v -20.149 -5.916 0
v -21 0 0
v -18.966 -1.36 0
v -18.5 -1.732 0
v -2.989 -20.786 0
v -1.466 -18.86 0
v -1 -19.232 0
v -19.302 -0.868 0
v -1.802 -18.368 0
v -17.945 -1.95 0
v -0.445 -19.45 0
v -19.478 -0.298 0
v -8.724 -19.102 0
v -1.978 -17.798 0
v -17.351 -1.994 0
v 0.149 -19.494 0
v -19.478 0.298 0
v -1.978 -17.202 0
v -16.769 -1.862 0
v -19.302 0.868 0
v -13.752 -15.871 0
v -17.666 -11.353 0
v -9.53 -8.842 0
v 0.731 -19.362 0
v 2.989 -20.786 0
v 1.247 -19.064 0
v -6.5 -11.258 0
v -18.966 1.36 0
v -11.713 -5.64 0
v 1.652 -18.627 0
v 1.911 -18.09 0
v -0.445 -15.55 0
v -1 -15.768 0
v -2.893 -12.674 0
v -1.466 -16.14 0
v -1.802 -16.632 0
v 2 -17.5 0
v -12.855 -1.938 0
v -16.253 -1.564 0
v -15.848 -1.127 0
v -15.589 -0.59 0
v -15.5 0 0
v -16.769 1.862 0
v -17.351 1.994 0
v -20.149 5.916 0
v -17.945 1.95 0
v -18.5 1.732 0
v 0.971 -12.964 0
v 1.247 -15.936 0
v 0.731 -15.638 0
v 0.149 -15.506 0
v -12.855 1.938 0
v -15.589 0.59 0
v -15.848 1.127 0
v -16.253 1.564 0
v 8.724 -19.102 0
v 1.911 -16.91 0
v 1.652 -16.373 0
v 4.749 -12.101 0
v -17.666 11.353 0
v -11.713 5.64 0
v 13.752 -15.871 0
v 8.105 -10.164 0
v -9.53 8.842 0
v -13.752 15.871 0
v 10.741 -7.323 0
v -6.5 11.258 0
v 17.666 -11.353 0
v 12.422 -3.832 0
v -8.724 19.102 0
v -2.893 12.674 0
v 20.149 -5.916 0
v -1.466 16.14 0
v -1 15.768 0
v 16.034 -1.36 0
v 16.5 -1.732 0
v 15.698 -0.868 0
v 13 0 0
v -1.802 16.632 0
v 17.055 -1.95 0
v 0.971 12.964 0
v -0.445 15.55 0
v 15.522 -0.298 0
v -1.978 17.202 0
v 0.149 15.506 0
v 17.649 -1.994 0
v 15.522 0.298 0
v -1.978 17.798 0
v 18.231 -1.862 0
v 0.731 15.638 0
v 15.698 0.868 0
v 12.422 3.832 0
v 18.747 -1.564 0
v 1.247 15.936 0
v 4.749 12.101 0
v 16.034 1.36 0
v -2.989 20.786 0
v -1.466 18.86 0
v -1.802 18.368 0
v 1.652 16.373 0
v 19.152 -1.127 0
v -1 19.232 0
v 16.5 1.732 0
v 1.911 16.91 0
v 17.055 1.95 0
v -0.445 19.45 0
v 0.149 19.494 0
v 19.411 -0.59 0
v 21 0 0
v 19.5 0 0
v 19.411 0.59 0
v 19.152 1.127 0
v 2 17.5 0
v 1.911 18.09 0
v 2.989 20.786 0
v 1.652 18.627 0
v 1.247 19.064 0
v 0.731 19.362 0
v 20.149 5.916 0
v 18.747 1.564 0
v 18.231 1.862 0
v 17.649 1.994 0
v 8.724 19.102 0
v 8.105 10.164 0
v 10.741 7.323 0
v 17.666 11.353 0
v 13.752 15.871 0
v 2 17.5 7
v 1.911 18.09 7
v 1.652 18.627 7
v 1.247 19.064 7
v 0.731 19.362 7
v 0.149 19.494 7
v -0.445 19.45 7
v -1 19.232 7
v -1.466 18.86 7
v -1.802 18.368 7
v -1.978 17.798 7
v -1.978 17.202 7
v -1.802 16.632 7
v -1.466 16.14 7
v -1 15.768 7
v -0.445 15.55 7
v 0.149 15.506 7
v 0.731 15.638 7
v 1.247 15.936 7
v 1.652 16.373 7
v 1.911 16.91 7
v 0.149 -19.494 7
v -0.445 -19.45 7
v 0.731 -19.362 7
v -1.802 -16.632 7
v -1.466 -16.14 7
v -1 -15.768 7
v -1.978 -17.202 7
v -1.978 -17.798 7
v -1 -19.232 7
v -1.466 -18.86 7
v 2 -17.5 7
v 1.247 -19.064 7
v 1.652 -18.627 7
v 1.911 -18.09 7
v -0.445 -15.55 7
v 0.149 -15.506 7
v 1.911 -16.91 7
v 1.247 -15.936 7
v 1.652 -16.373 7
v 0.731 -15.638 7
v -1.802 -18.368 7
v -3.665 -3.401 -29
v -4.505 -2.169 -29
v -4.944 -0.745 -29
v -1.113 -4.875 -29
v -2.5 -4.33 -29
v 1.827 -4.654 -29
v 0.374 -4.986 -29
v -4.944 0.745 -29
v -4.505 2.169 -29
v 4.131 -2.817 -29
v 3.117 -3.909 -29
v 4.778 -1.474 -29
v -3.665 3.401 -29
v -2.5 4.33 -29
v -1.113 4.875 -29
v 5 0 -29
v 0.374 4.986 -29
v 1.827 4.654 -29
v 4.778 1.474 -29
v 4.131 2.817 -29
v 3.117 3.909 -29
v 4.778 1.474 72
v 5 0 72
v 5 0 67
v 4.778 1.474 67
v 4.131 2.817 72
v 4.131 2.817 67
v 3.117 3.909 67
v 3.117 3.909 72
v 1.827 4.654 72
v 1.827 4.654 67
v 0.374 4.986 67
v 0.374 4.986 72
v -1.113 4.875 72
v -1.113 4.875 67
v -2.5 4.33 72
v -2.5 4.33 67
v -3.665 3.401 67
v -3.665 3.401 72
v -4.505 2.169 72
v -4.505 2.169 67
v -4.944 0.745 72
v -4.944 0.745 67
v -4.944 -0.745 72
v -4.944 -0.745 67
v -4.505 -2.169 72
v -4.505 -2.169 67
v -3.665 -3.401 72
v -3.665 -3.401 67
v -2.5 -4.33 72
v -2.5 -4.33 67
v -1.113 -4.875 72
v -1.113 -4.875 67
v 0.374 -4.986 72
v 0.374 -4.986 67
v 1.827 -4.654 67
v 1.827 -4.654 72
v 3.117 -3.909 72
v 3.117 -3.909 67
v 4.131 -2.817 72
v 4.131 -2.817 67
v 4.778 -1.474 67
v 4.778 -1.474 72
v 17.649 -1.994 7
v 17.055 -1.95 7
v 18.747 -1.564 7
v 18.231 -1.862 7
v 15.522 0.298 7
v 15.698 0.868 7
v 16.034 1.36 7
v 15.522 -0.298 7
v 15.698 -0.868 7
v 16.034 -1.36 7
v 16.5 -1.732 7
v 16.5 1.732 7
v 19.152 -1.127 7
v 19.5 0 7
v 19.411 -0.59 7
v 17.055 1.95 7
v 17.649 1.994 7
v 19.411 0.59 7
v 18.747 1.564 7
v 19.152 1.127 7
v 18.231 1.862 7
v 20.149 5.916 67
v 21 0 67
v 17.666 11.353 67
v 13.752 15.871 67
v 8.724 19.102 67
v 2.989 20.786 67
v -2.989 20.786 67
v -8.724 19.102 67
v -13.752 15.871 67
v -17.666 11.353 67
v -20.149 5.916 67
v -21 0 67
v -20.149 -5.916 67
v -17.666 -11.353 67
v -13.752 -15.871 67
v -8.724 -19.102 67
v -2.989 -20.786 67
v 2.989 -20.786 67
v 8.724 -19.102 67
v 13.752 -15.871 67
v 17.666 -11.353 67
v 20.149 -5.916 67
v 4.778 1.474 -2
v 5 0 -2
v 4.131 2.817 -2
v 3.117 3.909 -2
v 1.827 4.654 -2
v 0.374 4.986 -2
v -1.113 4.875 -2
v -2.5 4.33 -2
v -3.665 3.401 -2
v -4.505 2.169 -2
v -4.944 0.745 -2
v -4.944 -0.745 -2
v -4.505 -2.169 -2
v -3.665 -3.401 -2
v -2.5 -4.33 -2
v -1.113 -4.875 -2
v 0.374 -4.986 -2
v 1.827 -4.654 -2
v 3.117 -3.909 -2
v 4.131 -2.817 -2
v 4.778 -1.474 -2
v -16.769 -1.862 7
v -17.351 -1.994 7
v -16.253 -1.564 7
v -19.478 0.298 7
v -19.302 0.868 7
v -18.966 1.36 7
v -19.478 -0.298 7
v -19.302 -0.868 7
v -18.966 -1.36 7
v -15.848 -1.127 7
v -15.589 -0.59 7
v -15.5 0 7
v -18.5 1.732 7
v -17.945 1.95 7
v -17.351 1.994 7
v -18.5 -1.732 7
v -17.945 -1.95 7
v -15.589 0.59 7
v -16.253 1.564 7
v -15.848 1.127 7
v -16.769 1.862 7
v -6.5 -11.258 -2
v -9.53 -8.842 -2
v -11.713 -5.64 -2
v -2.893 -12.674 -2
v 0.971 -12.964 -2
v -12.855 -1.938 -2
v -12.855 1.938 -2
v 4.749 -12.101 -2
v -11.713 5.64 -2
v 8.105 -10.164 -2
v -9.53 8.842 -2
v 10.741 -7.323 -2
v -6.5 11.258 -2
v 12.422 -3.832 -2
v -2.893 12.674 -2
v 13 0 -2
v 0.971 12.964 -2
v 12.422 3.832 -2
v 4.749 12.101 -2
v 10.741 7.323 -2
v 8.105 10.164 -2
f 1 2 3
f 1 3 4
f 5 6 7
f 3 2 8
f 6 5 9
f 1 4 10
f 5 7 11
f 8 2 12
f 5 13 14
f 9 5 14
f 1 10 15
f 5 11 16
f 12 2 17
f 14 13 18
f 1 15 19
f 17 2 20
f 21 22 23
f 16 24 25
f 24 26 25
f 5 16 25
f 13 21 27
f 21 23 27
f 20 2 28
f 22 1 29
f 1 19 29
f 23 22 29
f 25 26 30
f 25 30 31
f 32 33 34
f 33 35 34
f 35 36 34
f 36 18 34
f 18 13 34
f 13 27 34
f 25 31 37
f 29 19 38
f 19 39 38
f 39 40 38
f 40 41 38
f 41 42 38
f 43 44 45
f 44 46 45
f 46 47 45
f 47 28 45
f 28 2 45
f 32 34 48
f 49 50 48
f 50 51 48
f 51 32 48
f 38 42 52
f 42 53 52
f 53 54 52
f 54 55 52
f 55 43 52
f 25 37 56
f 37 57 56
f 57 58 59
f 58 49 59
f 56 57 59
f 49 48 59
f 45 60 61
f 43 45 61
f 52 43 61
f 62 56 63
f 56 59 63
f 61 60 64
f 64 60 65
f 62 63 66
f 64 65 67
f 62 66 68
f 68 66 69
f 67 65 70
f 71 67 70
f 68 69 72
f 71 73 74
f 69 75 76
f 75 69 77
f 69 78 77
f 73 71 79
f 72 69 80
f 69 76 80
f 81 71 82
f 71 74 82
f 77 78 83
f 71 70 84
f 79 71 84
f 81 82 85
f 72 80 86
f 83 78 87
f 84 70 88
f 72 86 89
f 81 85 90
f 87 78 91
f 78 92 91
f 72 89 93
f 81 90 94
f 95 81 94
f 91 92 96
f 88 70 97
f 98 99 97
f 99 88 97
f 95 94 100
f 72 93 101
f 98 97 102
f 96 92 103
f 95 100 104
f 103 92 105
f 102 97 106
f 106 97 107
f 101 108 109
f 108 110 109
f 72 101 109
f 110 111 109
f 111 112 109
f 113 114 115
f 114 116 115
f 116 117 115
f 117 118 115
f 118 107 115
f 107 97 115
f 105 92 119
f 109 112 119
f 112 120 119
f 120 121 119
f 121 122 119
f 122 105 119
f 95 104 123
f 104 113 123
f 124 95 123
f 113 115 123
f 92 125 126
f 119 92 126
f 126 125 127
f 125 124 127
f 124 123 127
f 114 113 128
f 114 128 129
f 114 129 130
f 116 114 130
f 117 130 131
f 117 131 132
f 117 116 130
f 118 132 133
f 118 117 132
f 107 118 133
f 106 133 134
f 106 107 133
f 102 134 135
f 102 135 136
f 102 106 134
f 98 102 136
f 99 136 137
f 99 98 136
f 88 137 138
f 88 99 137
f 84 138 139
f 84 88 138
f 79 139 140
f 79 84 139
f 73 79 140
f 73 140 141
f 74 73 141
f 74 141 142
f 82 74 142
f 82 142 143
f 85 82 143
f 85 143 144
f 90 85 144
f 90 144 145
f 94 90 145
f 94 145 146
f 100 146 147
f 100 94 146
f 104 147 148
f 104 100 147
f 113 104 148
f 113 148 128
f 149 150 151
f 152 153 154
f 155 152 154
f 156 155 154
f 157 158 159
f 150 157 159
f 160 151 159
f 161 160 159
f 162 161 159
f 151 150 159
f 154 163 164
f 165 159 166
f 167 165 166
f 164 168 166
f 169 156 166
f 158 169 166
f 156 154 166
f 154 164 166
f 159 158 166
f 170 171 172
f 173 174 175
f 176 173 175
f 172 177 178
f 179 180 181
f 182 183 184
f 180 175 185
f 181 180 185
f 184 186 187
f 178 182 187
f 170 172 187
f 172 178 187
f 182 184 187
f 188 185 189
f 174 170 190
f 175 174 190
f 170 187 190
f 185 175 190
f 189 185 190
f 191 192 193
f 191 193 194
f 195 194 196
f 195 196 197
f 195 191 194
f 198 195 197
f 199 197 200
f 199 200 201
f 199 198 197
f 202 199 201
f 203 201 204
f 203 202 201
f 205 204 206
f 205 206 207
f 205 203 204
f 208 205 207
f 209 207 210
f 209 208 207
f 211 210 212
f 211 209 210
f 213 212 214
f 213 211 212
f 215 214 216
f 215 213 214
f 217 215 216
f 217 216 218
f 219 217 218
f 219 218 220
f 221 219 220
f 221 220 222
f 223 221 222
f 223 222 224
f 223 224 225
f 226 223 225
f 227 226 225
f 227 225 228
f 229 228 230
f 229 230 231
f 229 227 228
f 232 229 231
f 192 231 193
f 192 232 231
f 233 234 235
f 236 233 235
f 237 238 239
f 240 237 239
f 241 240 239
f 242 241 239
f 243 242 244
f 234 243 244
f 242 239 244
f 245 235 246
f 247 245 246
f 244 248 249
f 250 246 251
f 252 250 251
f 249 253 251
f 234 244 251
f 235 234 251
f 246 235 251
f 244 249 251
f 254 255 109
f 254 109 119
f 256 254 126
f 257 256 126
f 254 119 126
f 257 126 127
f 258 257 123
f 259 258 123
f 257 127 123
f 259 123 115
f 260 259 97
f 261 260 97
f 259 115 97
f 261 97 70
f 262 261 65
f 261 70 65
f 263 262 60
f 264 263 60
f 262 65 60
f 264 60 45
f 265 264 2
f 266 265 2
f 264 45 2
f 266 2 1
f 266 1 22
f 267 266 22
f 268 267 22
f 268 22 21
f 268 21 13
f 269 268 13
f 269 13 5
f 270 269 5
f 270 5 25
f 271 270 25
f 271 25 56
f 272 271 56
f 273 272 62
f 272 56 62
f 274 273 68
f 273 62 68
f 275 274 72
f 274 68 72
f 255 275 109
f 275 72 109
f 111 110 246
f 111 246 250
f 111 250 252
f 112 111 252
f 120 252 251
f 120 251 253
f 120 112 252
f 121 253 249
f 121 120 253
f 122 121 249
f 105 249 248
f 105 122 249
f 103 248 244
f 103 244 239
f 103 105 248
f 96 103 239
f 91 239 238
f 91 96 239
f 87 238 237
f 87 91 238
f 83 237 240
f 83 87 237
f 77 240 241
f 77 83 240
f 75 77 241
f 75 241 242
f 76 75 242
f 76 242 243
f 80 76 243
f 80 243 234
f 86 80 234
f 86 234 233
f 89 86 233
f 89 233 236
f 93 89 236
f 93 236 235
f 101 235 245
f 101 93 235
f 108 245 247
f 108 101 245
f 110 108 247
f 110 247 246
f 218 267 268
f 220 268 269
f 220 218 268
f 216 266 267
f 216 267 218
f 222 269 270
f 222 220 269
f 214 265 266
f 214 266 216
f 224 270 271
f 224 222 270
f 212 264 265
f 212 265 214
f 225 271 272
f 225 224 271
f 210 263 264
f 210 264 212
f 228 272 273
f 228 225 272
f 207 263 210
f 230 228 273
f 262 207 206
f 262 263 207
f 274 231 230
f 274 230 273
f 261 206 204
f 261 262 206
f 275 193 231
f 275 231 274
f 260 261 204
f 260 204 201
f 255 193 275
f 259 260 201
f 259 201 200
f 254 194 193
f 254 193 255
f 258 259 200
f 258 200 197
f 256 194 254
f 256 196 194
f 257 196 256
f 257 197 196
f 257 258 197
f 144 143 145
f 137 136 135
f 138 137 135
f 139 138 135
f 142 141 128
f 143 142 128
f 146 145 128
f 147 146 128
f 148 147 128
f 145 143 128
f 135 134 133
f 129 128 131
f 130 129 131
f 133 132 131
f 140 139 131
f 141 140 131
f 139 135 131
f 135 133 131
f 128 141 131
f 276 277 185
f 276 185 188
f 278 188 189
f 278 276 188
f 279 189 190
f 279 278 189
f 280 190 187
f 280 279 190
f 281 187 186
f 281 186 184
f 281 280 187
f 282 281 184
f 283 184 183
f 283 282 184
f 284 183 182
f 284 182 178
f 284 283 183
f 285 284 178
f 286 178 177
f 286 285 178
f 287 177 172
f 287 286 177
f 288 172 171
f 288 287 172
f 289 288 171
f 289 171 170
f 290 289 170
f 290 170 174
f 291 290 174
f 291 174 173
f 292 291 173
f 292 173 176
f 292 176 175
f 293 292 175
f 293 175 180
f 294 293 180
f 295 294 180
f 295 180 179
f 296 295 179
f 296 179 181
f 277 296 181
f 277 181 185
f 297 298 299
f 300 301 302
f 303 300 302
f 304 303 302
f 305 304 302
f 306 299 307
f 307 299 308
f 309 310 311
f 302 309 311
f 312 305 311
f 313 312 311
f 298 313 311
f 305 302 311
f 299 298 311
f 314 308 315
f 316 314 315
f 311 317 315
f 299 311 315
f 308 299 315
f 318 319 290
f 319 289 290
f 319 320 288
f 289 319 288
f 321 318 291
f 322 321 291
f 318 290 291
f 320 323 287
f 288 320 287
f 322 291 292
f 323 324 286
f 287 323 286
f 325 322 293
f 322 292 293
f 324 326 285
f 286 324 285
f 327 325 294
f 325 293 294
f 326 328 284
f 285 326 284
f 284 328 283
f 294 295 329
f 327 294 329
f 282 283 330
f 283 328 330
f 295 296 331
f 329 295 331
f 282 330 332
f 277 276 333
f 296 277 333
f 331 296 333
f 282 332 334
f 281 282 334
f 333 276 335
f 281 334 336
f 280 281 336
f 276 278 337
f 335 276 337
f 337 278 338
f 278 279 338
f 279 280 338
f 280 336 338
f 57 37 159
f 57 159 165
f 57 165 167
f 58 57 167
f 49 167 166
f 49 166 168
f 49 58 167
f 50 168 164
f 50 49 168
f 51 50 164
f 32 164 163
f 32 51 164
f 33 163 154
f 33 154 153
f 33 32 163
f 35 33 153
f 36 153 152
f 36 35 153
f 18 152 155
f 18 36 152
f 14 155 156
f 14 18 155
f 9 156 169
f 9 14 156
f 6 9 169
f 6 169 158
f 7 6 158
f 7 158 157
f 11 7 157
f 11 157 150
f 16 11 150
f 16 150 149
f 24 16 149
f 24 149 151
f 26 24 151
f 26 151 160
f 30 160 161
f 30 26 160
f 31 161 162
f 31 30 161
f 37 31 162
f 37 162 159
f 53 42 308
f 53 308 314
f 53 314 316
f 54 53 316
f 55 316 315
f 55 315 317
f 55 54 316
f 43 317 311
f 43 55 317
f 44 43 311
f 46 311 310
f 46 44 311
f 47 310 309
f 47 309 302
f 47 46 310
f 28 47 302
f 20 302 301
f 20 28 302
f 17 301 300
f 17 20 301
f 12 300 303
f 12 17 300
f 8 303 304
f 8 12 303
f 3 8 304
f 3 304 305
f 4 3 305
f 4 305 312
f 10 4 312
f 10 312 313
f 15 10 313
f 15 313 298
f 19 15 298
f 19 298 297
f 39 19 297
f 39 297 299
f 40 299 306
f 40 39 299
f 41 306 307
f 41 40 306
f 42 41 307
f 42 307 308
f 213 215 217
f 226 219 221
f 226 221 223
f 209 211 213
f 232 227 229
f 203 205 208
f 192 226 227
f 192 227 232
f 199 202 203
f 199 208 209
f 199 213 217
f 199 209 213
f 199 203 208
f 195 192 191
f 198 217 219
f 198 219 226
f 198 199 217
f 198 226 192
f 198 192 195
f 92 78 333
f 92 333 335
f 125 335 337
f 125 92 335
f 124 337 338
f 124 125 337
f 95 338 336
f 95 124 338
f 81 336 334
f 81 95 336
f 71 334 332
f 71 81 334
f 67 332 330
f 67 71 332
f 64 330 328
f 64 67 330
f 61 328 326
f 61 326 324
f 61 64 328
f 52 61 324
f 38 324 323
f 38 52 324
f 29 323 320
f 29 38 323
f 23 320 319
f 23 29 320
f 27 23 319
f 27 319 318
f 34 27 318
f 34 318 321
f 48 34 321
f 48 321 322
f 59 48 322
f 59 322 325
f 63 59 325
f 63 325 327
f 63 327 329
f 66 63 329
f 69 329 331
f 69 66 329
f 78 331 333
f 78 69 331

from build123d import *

# Parameters (mm, degrees)
SKETCH_1_R          = 21
EXTRUDE_1_DEPTH     = 67
SKETCH_3_R          = 13
EXTRUDE_3_DEPTH     = 2
SKETCH_4_R          = 5
EXTRUDE_4_DEPTH     = 29
SKETCH_5_R          = 2.016017639
SKETCH_5_R_2        = 2.040158569
SKETCH_5_R_3        = 1.937096917
SKETCH_5_R_4        = 2
SKETCH_5_R_5        = 4.5
EXTRUDE_5_DEPTH     = 0.7
EXTRUDE_START       = 5
SKETCH_7_R          = 5
EXTRUDE_6_DEPTH     = 5
SKETCH_6_R          = 2
CUT_EXTRUDE_1_DEPTH = 7


with BuildPart() as part:
    # 草图1 → 凸台-拉伸1 (new body)
    with BuildSketch(Plane.XY):
        Circle(SKETCH_1_R)
    extrude(amount=EXTRUDE_1_DEPTH)

    # 草图3 → 凸台-拉伸3 (add)
    with BuildSketch(Plane.XY):
        Circle(SKETCH_3_R)
    extrude(amount=-EXTRUDE_3_DEPTH)

    # 草图4 → 凸台-拉伸4 (add)
    with BuildSketch(Plane.XY):
        Circle(SKETCH_4_R)
    extrude(amount=-EXTRUDE_4_DEPTH)

    # 草图5 → 凸台-拉伸5 (add)
    with BuildSketch(Plane.XY):
        with Locations((17.5, 0)):
            Circle(SKETCH_5_R)
        with Locations((0, -17.5)):
            Circle(SKETCH_5_R_2)
        with Locations((-17.5, 0)):
            Circle(SKETCH_5_R_3)
        with Locations((0, 17.5)):
            Circle(SKETCH_5_R_4)
        with Locations((12.557158291, 12.188838159)):
            Circle(SKETCH_5_R_4)
        with Locations((-12.557158291, 12.188838159)):
            Circle(SKETCH_5_R_4)
        with Locations((-12.557158291, -12.188838159)):
            Circle(SKETCH_5_R_4)
        with Locations((12.557158291, -12.188838159)):
            Circle(SKETCH_5_R_4)
        Circle(SKETCH_5_R_5)
    extrude(amount=EXTRUDE_5_DEPTH)

    # 草图7 → 凸台-拉伸6 (add)
    with BuildSketch(Plane.XY.offset(67).offset(EXTRUDE_START)):
        Circle(SKETCH_7_R)
    extrude(amount=-EXTRUDE_6_DEPTH)

    # 草图6 → 切除-拉伸1 (cut)
    with BuildSketch(Plane.XY):
        with Locations((-17.5, 0)):
            Circle(SKETCH_6_R)
        with Locations((17.5, 0)):
            Circle(SKETCH_6_R)
        with Locations((0, 17.5)):
            Circle(SKETCH_6_R)
        with Locations((0, -17.5)):
            Circle(SKETCH_6_R)
    extrude(amount=CUT_EXTRUDE_1_DEPTH, mode=Mode.SUBTRACT)


solid = part.part
